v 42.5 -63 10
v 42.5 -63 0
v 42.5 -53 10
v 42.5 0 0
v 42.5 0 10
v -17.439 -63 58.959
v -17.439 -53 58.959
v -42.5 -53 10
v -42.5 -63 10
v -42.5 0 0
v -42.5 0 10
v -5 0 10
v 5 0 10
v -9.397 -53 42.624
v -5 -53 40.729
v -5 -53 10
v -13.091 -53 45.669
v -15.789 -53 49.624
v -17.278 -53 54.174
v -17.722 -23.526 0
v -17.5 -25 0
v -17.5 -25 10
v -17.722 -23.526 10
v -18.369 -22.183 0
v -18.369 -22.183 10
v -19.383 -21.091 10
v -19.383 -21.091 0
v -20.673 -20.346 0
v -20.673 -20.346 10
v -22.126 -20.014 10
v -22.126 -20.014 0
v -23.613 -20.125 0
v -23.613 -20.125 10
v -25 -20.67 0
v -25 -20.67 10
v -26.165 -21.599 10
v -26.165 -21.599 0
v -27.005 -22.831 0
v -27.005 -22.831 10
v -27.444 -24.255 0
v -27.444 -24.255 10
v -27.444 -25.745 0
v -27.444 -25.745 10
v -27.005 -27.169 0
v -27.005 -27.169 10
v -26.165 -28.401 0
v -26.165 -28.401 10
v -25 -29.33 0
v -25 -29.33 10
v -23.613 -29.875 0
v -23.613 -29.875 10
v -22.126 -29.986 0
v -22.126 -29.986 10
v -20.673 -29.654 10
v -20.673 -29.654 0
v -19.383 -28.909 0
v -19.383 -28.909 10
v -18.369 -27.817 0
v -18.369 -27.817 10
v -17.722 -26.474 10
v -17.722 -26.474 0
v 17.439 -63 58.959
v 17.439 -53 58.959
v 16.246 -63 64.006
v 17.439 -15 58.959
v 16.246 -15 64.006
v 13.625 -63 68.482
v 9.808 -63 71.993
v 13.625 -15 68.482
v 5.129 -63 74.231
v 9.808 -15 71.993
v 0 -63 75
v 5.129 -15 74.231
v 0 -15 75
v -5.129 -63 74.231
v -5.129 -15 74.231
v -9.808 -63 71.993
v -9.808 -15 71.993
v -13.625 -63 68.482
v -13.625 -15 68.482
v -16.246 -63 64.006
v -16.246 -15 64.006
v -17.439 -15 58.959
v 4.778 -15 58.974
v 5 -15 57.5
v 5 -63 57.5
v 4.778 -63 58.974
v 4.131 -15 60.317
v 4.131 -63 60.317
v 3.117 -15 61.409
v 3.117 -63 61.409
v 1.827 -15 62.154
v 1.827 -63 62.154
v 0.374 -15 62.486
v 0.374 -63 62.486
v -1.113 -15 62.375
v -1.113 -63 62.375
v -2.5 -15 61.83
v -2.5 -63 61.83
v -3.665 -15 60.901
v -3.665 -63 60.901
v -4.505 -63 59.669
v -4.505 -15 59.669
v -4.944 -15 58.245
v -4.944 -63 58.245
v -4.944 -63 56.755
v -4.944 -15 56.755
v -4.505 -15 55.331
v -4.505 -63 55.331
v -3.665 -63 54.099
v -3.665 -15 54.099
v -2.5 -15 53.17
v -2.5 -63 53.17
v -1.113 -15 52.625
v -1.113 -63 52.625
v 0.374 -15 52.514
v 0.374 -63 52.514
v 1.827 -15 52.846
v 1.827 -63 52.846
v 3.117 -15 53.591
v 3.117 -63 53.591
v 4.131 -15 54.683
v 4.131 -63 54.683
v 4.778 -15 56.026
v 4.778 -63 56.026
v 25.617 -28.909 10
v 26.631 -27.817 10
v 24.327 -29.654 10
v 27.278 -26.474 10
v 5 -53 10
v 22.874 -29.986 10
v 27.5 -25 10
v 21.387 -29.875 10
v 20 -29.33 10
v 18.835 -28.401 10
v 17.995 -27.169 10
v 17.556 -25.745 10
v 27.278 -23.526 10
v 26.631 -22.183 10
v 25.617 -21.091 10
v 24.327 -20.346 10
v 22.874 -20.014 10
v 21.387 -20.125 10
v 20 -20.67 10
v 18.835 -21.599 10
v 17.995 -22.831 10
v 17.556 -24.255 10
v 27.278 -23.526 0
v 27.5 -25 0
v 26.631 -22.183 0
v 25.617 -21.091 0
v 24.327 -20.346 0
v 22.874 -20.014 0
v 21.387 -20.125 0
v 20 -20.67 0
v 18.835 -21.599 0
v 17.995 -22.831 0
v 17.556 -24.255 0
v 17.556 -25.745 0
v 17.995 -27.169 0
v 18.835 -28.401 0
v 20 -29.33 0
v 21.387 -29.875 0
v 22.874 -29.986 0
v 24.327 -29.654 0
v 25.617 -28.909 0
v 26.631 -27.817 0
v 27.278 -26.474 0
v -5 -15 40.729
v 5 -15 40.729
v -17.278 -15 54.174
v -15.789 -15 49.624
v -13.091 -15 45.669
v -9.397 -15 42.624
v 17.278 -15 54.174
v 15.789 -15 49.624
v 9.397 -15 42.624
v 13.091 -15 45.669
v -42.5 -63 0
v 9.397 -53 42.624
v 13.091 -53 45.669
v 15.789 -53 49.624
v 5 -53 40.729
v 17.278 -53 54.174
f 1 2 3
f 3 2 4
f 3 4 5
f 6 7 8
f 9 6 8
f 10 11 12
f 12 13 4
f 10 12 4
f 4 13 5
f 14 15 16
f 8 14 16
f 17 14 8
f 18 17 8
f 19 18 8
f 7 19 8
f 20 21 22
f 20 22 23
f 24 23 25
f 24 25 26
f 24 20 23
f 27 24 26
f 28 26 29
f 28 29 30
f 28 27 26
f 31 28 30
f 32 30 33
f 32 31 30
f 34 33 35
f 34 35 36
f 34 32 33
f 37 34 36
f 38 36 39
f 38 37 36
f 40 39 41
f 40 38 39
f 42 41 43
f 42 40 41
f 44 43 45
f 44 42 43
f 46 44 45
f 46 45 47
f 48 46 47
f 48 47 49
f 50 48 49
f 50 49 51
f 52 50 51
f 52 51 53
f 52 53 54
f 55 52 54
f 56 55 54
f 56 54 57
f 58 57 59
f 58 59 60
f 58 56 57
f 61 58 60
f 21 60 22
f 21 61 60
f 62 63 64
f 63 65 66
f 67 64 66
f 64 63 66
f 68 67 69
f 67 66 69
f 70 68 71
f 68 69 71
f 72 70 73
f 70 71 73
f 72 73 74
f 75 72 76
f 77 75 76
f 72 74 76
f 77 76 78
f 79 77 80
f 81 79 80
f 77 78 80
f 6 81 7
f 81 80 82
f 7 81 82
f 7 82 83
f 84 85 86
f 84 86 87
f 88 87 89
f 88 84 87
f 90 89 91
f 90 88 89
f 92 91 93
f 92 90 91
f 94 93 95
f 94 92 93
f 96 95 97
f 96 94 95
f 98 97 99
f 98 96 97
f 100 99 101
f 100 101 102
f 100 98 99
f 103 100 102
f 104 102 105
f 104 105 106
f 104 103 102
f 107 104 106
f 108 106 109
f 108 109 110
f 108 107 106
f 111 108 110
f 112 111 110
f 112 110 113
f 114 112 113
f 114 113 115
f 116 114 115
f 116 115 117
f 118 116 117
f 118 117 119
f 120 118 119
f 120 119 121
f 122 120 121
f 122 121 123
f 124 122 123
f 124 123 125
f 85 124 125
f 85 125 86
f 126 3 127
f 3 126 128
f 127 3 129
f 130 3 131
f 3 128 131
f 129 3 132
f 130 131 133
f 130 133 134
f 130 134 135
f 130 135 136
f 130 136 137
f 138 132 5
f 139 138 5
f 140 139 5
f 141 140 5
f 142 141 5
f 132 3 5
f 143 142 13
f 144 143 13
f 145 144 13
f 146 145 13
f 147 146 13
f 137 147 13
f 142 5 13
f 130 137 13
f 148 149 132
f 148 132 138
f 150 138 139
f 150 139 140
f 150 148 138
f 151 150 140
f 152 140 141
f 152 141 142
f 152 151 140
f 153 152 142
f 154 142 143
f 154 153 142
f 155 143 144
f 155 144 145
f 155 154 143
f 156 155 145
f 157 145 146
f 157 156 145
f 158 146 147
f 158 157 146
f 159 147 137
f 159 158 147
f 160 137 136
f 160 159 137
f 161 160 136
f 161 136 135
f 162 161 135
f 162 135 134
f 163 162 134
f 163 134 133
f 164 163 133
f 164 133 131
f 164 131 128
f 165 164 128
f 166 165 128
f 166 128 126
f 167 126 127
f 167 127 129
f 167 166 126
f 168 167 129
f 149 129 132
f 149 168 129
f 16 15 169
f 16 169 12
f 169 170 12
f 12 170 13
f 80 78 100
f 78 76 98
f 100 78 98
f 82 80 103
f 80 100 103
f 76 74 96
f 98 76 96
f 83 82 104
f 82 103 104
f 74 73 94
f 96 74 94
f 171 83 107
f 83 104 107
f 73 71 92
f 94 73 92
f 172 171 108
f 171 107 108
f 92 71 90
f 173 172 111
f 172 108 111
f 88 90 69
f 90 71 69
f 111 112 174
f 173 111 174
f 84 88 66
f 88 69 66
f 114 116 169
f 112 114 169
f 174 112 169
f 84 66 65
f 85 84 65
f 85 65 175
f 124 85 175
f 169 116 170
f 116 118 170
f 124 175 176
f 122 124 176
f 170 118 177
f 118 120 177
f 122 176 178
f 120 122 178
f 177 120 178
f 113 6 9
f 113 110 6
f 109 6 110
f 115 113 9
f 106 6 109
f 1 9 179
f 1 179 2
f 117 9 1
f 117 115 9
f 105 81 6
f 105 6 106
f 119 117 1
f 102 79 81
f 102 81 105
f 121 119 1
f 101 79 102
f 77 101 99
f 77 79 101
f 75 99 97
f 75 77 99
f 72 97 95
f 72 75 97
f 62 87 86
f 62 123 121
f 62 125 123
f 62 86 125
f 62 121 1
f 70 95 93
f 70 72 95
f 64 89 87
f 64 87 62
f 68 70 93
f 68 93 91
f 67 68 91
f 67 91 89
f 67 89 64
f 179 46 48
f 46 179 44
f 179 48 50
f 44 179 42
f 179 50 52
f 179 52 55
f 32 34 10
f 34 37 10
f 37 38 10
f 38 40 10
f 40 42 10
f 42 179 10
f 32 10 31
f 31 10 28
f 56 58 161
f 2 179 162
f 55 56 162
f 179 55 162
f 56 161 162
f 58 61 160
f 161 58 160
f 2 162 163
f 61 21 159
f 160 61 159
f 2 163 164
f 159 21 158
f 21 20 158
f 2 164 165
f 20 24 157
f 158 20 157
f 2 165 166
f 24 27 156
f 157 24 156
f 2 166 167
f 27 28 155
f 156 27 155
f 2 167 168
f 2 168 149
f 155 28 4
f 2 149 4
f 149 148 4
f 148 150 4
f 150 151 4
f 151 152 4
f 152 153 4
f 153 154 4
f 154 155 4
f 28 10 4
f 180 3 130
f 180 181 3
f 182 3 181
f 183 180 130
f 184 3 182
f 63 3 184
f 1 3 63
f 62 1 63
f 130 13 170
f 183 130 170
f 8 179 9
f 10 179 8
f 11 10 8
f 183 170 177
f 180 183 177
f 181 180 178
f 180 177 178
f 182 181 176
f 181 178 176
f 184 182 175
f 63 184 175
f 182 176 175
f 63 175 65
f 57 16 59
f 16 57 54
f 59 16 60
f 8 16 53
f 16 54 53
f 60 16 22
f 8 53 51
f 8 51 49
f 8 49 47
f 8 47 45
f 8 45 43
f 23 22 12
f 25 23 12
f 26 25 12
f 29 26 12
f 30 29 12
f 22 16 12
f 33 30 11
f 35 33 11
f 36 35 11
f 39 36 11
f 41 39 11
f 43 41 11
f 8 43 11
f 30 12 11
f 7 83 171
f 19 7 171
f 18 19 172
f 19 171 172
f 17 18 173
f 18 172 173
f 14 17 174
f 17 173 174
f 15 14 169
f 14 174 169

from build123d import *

# Parameters (mm, degrees)
F0_W     = 37.5
F0_H     = 10
F0_R     = 5
F1_DEPTH = 63
F2_R     = 5
F3_DEPTH = 10
F5_DEPTH = 53
F7_DEPTH = 63
F9_DEPTH = 25


with BuildPart() as f1:
    # F0 (on Front) → F1 (new body)
    with BuildSketch(Plane.XZ):
        Polygon((-5, 0), (0, 0), (5, 0), (5, 10), (-5, 10), align=None)
        with Locations((-23.75, 5)):
            Rectangle(F0_W, F0_H)
        with Locations((23.75, 5)):
            Rectangle(F0_W, F0_H)
        with BuildLine():
            Line((-42.5, 10), (-5, 10))
            Line((-5, 10), (-5, 40.72949))
            ThreePointArc((-5, 40.72949), (-14.455244, 47.63613), (-17.439102, 58.95867))
            Line((-17.439102, 58.95867), (-42.5, 10))
        make_face()
        with BuildLine():
            Line((5, 40.72949), (5, 10))
            Line((5, 10), (42.5, 10))
            Line((42.5, 10), (17.439102, 58.95867))
            ThreePointArc((17.439102, 58.95867), (17.484769, 58.22997), (17.5, 57.5))
            ThreePointArc((17.5, 57.5), (14.031215, 47.04175), (5, 40.72949))
        make_face()
        with BuildLine():
            ThreePointArc((-17.439102, 58.95867), (-14.455244, 47.63613), (-5, 40.72949))
            ThreePointArc((-5, 40.72949), (0, 40), (5, 40.72949))
            ThreePointArc((5, 40.72949), (14.031215, 47.04175), (17.5, 57.5))
            ThreePointArc((17.5, 57.5), (17.484769, 58.22997), (17.439102, 58.95867))
            ThreePointArc((17.439102, 58.95867), (0, 75), (-17.439102, 58.95867))
        make_face()
        with Locations((0, 57.5)):
            Circle(F0_R, mode=Mode.SUBTRACT)
    extrude(amount=F1_DEPTH)

    # F2 (on Top) → F3 (cut)
    with BuildSketch(Plane.XY):
        with Locations((-22.5, -25)):
            Circle(F2_R)
        with Locations((22.5, -25)):
            Circle(F2_R)
    extrude(amount=F3_DEPTH, mode=Mode.SUBTRACT)

    # F4 (on face) → F5 (cut)
    with BuildSketch(Plane(origin=(0, 0, 0), x_dir=(-1, 0, 0), z_dir=(0, 1, 0))):
        with BuildLine():
            Line((-17.439102, 58.95867), (-42.5, 10))
            Line((-42.5, 10), (-5, 10))
            Line((-5, 10), (-5, 40.72949))
            ThreePointArc((-5, 40.72949), (-14.579622, 47.551258), (-17.439102, 58.95867))
        make_face()
        with BuildLine():
            Line((42.5, 10), (17.439102, 58.95867))
            ThreePointArc((17.439102, 58.95867), (14.579622, 47.551258), (5, 40.72949))
            Line((5, 40.72949), (5, 10))
            Line((5, 10), (42.5, 10))
        make_face()
    extrude(amount=-F5_DEPTH, mode=Mode.SUBTRACT)

    # F6 (on face) → F7 (join)
    with BuildSketch(Plane.XZ.offset(63)):
        with BuildLine():
            Line((-5, 40.72949), (-5, 10))
            Line((-5, 10), (5, 10))
            Line((5, 10), (5, 40.72949))
            ThreePointArc((5, 40.72949), (0, 40), (-5, 40.72949))
        make_face()
    extrude(amount=-F7_DEPTH)

    # F8 (on face) → F9 (cut, symmetric)
    with BuildSketch(Plane.YZ.offset(5)):
        Polygon((-15, 40.72949), (0, 10), (0, 75), (-15, 75), align=None)
    extrude(amount=F9_DEPTH, both=True, mode=Mode.SUBTRACT)


solid = f1.part
